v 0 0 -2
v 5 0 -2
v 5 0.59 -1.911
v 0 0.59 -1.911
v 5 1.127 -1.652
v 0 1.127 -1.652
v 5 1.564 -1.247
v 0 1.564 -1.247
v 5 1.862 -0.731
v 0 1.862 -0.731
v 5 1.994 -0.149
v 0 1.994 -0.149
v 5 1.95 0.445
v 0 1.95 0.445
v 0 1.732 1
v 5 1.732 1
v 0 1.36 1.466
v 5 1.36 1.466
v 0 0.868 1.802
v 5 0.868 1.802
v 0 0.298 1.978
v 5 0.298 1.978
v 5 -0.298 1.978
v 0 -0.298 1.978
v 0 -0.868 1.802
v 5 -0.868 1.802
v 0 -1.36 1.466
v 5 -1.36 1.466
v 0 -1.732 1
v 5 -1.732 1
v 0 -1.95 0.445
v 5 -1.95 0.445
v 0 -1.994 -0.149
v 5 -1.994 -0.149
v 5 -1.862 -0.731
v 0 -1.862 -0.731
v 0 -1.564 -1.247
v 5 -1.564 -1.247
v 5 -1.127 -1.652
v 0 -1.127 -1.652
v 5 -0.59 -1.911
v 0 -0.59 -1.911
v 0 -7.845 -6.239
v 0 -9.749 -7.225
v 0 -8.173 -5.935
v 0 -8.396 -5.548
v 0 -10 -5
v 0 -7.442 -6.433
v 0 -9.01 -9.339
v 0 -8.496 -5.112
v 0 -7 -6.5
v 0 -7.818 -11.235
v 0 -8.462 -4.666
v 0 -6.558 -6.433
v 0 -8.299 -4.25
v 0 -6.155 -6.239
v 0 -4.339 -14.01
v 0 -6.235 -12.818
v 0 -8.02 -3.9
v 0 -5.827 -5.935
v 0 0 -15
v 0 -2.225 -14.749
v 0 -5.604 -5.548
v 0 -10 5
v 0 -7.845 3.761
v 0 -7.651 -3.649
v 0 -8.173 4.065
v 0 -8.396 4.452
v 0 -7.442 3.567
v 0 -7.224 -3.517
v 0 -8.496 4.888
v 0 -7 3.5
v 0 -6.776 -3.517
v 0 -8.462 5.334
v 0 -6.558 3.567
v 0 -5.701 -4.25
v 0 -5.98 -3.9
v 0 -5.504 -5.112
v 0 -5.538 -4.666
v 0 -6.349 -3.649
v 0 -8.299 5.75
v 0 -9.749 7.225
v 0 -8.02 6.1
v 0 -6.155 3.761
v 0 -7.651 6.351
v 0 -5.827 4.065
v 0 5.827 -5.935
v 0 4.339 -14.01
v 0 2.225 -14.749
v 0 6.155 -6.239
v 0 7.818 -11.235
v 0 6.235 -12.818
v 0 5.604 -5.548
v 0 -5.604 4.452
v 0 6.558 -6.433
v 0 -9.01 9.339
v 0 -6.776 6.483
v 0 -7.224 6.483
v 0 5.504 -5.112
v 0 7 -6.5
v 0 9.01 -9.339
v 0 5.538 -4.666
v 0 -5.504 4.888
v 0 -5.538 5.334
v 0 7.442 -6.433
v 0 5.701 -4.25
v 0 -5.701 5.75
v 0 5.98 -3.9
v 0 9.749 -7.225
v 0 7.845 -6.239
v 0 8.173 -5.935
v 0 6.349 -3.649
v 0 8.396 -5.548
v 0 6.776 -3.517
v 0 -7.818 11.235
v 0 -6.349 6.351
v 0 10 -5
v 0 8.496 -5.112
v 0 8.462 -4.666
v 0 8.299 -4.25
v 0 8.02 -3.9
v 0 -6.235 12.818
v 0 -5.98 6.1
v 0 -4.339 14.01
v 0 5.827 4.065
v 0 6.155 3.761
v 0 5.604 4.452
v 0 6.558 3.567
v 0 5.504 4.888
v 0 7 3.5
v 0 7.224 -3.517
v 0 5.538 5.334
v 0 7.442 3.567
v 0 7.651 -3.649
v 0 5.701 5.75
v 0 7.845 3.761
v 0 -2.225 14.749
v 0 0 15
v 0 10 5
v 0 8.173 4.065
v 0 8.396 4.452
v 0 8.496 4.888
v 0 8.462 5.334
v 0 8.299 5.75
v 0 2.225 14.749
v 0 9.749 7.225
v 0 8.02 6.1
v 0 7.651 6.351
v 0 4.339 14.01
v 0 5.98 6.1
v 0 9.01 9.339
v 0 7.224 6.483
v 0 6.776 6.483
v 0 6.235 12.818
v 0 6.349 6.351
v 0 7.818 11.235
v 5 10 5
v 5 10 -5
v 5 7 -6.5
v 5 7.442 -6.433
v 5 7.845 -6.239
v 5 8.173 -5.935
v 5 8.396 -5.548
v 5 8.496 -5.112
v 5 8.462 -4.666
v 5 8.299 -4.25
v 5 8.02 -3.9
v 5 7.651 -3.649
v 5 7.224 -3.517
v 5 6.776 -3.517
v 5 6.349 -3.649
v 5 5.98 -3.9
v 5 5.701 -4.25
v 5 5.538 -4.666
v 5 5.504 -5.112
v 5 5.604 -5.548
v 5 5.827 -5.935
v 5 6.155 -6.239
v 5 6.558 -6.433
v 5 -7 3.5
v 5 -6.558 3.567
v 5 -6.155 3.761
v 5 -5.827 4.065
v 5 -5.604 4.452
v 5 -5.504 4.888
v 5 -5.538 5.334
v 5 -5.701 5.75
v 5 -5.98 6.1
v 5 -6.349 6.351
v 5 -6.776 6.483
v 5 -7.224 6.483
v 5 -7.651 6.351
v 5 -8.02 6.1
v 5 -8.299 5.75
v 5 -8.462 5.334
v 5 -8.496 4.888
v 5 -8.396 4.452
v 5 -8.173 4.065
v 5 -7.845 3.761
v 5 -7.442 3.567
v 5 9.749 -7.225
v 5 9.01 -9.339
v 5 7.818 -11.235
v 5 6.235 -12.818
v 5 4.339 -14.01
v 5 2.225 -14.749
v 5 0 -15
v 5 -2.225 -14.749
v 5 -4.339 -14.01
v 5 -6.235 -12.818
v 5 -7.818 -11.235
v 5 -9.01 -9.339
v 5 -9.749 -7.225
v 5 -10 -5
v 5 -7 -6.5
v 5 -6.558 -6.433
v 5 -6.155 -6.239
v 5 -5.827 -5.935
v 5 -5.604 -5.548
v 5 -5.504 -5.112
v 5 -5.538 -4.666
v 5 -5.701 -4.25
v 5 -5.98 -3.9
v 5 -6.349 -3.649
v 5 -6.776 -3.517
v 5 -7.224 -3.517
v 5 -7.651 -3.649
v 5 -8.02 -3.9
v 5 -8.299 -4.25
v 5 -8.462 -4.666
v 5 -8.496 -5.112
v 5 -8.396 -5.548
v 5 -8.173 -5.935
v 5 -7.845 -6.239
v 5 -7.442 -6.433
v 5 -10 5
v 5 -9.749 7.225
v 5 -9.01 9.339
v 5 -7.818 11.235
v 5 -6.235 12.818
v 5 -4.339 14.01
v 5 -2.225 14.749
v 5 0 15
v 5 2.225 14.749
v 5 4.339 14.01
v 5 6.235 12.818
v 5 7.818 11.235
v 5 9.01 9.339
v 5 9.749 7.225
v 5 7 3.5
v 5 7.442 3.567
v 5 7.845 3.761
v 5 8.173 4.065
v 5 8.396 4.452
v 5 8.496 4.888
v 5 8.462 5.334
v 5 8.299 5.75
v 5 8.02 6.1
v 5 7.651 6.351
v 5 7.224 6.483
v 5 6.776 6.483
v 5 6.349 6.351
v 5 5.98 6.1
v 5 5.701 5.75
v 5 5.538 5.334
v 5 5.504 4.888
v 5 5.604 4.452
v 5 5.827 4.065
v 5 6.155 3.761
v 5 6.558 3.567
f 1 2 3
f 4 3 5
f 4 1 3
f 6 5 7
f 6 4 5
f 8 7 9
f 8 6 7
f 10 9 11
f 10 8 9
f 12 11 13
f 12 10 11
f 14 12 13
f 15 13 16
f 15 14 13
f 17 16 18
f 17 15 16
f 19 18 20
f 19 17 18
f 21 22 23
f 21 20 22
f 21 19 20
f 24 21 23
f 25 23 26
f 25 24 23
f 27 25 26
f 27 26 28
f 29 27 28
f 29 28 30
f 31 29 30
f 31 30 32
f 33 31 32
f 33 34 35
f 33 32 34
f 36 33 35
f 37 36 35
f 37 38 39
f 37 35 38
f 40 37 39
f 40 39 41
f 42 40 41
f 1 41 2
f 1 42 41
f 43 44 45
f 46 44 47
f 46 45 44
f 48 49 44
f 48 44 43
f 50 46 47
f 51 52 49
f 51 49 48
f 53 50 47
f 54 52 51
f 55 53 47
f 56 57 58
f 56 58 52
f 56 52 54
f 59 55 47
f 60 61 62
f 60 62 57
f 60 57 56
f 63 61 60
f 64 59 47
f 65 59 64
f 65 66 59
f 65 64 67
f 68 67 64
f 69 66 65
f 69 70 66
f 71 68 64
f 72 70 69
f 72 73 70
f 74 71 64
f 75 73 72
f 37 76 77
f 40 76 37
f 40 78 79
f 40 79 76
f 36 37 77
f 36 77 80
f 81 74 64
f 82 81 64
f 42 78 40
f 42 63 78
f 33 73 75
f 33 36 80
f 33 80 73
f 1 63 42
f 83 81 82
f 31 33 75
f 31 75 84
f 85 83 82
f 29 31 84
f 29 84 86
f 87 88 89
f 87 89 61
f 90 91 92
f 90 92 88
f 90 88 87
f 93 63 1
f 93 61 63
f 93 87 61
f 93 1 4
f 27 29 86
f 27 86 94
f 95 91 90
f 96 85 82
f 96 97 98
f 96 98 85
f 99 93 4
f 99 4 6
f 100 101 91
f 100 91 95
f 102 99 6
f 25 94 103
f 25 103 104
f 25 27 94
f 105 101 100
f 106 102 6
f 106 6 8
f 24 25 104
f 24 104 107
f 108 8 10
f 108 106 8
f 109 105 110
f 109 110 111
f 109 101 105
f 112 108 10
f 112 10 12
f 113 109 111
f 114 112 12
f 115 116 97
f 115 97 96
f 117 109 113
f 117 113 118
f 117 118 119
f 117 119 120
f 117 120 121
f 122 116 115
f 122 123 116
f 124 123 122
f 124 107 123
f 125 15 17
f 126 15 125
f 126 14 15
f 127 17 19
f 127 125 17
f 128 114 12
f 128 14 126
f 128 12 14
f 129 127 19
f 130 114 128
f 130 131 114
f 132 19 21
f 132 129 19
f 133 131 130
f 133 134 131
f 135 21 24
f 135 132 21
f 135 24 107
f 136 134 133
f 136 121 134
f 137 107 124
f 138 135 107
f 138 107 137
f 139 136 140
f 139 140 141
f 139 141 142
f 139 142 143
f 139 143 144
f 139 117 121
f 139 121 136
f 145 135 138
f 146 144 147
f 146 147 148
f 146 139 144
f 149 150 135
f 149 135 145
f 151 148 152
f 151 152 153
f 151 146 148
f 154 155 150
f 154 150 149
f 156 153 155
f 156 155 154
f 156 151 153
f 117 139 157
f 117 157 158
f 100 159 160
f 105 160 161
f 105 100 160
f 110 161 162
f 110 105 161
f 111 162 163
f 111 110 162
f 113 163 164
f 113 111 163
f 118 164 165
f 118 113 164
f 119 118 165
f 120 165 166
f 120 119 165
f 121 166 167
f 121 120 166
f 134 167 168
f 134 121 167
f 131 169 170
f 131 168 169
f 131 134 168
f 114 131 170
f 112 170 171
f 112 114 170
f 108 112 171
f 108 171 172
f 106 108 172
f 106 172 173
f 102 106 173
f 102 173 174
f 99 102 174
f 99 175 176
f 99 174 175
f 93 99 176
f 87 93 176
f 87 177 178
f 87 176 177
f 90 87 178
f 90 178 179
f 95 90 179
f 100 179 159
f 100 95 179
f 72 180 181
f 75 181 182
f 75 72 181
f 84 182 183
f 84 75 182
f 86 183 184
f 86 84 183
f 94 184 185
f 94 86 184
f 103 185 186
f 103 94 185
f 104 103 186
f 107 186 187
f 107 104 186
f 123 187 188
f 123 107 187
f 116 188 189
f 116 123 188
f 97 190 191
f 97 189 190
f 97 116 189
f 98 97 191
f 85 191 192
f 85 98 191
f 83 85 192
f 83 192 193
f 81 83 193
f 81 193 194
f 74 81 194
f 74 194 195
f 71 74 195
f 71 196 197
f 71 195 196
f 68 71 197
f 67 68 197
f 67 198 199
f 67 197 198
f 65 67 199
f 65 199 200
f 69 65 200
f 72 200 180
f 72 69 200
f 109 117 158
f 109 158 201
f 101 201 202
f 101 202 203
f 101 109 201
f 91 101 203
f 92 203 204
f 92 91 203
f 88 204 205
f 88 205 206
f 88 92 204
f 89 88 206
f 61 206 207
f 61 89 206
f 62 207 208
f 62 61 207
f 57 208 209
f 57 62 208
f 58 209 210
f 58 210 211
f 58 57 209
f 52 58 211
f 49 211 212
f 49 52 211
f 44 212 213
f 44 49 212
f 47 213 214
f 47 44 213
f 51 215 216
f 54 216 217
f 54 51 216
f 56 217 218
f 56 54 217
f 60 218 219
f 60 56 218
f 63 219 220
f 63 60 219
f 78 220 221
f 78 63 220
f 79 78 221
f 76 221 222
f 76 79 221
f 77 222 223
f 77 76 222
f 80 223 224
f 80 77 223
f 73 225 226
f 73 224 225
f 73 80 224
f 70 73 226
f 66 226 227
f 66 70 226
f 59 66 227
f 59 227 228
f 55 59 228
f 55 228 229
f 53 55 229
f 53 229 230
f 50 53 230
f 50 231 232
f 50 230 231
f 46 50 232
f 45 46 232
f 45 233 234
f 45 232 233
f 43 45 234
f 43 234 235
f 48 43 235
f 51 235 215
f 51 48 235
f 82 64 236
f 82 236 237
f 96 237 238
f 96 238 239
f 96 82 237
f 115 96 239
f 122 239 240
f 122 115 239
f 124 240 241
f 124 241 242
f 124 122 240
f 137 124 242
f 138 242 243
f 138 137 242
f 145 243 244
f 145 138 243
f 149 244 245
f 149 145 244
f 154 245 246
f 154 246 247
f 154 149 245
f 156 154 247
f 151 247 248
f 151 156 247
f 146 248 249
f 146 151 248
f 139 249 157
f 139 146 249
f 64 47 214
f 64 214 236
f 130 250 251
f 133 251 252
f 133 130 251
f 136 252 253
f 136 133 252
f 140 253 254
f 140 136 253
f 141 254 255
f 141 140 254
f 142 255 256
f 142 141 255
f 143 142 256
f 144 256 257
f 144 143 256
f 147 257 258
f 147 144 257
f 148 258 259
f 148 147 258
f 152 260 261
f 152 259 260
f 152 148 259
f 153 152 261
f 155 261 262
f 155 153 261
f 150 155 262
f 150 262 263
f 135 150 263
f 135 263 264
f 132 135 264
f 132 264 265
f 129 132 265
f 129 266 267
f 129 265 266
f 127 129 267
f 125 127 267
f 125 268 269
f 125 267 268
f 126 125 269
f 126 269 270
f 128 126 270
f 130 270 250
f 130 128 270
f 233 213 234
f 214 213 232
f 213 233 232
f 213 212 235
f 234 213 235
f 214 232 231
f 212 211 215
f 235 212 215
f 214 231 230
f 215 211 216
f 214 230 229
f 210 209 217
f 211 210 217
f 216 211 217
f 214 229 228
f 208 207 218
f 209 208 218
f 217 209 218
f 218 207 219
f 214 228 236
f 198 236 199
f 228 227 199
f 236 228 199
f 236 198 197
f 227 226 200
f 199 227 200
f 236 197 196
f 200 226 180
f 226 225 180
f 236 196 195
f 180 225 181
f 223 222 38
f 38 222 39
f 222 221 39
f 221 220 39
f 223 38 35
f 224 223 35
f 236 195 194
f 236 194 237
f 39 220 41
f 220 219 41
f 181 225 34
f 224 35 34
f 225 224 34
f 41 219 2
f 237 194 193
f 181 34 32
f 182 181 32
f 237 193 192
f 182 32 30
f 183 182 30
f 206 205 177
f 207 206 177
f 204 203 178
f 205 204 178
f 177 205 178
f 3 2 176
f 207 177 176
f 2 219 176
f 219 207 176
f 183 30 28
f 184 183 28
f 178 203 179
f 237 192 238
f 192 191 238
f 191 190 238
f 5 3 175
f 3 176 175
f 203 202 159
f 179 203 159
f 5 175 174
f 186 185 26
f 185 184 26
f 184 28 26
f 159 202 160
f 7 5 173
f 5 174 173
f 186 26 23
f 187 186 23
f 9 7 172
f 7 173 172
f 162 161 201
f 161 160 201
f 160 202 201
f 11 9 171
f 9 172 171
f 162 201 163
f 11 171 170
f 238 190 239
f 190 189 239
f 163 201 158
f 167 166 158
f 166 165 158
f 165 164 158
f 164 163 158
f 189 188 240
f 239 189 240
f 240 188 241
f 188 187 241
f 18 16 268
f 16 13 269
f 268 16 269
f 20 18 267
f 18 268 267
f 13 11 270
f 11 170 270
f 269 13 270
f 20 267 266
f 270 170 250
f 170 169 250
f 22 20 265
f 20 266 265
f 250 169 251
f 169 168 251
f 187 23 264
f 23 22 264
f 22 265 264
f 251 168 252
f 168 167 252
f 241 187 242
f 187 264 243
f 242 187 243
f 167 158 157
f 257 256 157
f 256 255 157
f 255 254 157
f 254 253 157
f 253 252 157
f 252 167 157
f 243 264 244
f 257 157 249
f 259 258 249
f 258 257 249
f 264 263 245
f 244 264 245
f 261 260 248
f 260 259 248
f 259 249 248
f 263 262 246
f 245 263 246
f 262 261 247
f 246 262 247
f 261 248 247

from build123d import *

# Parameters (mm, degrees)
ESTRUSIONE_ESTRUSIONE1_DEPTH = 5
SCHIZZO2_R                   = 1.5
SCHIZZO2_R_2                 = 2
TAGLIO_ESTRUSIONE1_DEPTH     = 6


with BuildPart() as part:
    # Schizzo1 → Estrusione-Estrusione1 (new body)
    with BuildSketch(Plane(origin=(0, 0, 0), x_dir=(0, 0, -1), z_dir=(1, 0, 0))):
        with BuildLine():
            Line((-5, 10), (5, 10))
            ThreePointArc((5, 10), (15, 0), (5, -10))
            Line((5, -10), (-5, -10))
            ThreePointArc((-5, -10), (-15, 0), (-5, 10))
        make_face()
    extrude(amount=ESTRUSIONE_ESTRUSIONE1_DEPTH)

    # Schizzo2 → Taglio-Estrusione1 (cut, through all)
    with BuildSketch(Plane(origin=(0, 0, 0), x_dir=(0, 0, -1), z_dir=(1, 0, 0))):
        with Locations((-5, 7)):
            Circle(SCHIZZO2_R)
        Circle(SCHIZZO2_R_2)
        with Locations((5, 7)):
            Circle(SCHIZZO2_R)
        with Locations((-5, -7)):
            Circle(SCHIZZO2_R)
        with Locations((5, -7)):
            Circle(SCHIZZO2_R)
    extrude(amount=TAGLIO_ESTRUSIONE1_DEPTH, mode=Mode.SUBTRACT)


solid = part.part
